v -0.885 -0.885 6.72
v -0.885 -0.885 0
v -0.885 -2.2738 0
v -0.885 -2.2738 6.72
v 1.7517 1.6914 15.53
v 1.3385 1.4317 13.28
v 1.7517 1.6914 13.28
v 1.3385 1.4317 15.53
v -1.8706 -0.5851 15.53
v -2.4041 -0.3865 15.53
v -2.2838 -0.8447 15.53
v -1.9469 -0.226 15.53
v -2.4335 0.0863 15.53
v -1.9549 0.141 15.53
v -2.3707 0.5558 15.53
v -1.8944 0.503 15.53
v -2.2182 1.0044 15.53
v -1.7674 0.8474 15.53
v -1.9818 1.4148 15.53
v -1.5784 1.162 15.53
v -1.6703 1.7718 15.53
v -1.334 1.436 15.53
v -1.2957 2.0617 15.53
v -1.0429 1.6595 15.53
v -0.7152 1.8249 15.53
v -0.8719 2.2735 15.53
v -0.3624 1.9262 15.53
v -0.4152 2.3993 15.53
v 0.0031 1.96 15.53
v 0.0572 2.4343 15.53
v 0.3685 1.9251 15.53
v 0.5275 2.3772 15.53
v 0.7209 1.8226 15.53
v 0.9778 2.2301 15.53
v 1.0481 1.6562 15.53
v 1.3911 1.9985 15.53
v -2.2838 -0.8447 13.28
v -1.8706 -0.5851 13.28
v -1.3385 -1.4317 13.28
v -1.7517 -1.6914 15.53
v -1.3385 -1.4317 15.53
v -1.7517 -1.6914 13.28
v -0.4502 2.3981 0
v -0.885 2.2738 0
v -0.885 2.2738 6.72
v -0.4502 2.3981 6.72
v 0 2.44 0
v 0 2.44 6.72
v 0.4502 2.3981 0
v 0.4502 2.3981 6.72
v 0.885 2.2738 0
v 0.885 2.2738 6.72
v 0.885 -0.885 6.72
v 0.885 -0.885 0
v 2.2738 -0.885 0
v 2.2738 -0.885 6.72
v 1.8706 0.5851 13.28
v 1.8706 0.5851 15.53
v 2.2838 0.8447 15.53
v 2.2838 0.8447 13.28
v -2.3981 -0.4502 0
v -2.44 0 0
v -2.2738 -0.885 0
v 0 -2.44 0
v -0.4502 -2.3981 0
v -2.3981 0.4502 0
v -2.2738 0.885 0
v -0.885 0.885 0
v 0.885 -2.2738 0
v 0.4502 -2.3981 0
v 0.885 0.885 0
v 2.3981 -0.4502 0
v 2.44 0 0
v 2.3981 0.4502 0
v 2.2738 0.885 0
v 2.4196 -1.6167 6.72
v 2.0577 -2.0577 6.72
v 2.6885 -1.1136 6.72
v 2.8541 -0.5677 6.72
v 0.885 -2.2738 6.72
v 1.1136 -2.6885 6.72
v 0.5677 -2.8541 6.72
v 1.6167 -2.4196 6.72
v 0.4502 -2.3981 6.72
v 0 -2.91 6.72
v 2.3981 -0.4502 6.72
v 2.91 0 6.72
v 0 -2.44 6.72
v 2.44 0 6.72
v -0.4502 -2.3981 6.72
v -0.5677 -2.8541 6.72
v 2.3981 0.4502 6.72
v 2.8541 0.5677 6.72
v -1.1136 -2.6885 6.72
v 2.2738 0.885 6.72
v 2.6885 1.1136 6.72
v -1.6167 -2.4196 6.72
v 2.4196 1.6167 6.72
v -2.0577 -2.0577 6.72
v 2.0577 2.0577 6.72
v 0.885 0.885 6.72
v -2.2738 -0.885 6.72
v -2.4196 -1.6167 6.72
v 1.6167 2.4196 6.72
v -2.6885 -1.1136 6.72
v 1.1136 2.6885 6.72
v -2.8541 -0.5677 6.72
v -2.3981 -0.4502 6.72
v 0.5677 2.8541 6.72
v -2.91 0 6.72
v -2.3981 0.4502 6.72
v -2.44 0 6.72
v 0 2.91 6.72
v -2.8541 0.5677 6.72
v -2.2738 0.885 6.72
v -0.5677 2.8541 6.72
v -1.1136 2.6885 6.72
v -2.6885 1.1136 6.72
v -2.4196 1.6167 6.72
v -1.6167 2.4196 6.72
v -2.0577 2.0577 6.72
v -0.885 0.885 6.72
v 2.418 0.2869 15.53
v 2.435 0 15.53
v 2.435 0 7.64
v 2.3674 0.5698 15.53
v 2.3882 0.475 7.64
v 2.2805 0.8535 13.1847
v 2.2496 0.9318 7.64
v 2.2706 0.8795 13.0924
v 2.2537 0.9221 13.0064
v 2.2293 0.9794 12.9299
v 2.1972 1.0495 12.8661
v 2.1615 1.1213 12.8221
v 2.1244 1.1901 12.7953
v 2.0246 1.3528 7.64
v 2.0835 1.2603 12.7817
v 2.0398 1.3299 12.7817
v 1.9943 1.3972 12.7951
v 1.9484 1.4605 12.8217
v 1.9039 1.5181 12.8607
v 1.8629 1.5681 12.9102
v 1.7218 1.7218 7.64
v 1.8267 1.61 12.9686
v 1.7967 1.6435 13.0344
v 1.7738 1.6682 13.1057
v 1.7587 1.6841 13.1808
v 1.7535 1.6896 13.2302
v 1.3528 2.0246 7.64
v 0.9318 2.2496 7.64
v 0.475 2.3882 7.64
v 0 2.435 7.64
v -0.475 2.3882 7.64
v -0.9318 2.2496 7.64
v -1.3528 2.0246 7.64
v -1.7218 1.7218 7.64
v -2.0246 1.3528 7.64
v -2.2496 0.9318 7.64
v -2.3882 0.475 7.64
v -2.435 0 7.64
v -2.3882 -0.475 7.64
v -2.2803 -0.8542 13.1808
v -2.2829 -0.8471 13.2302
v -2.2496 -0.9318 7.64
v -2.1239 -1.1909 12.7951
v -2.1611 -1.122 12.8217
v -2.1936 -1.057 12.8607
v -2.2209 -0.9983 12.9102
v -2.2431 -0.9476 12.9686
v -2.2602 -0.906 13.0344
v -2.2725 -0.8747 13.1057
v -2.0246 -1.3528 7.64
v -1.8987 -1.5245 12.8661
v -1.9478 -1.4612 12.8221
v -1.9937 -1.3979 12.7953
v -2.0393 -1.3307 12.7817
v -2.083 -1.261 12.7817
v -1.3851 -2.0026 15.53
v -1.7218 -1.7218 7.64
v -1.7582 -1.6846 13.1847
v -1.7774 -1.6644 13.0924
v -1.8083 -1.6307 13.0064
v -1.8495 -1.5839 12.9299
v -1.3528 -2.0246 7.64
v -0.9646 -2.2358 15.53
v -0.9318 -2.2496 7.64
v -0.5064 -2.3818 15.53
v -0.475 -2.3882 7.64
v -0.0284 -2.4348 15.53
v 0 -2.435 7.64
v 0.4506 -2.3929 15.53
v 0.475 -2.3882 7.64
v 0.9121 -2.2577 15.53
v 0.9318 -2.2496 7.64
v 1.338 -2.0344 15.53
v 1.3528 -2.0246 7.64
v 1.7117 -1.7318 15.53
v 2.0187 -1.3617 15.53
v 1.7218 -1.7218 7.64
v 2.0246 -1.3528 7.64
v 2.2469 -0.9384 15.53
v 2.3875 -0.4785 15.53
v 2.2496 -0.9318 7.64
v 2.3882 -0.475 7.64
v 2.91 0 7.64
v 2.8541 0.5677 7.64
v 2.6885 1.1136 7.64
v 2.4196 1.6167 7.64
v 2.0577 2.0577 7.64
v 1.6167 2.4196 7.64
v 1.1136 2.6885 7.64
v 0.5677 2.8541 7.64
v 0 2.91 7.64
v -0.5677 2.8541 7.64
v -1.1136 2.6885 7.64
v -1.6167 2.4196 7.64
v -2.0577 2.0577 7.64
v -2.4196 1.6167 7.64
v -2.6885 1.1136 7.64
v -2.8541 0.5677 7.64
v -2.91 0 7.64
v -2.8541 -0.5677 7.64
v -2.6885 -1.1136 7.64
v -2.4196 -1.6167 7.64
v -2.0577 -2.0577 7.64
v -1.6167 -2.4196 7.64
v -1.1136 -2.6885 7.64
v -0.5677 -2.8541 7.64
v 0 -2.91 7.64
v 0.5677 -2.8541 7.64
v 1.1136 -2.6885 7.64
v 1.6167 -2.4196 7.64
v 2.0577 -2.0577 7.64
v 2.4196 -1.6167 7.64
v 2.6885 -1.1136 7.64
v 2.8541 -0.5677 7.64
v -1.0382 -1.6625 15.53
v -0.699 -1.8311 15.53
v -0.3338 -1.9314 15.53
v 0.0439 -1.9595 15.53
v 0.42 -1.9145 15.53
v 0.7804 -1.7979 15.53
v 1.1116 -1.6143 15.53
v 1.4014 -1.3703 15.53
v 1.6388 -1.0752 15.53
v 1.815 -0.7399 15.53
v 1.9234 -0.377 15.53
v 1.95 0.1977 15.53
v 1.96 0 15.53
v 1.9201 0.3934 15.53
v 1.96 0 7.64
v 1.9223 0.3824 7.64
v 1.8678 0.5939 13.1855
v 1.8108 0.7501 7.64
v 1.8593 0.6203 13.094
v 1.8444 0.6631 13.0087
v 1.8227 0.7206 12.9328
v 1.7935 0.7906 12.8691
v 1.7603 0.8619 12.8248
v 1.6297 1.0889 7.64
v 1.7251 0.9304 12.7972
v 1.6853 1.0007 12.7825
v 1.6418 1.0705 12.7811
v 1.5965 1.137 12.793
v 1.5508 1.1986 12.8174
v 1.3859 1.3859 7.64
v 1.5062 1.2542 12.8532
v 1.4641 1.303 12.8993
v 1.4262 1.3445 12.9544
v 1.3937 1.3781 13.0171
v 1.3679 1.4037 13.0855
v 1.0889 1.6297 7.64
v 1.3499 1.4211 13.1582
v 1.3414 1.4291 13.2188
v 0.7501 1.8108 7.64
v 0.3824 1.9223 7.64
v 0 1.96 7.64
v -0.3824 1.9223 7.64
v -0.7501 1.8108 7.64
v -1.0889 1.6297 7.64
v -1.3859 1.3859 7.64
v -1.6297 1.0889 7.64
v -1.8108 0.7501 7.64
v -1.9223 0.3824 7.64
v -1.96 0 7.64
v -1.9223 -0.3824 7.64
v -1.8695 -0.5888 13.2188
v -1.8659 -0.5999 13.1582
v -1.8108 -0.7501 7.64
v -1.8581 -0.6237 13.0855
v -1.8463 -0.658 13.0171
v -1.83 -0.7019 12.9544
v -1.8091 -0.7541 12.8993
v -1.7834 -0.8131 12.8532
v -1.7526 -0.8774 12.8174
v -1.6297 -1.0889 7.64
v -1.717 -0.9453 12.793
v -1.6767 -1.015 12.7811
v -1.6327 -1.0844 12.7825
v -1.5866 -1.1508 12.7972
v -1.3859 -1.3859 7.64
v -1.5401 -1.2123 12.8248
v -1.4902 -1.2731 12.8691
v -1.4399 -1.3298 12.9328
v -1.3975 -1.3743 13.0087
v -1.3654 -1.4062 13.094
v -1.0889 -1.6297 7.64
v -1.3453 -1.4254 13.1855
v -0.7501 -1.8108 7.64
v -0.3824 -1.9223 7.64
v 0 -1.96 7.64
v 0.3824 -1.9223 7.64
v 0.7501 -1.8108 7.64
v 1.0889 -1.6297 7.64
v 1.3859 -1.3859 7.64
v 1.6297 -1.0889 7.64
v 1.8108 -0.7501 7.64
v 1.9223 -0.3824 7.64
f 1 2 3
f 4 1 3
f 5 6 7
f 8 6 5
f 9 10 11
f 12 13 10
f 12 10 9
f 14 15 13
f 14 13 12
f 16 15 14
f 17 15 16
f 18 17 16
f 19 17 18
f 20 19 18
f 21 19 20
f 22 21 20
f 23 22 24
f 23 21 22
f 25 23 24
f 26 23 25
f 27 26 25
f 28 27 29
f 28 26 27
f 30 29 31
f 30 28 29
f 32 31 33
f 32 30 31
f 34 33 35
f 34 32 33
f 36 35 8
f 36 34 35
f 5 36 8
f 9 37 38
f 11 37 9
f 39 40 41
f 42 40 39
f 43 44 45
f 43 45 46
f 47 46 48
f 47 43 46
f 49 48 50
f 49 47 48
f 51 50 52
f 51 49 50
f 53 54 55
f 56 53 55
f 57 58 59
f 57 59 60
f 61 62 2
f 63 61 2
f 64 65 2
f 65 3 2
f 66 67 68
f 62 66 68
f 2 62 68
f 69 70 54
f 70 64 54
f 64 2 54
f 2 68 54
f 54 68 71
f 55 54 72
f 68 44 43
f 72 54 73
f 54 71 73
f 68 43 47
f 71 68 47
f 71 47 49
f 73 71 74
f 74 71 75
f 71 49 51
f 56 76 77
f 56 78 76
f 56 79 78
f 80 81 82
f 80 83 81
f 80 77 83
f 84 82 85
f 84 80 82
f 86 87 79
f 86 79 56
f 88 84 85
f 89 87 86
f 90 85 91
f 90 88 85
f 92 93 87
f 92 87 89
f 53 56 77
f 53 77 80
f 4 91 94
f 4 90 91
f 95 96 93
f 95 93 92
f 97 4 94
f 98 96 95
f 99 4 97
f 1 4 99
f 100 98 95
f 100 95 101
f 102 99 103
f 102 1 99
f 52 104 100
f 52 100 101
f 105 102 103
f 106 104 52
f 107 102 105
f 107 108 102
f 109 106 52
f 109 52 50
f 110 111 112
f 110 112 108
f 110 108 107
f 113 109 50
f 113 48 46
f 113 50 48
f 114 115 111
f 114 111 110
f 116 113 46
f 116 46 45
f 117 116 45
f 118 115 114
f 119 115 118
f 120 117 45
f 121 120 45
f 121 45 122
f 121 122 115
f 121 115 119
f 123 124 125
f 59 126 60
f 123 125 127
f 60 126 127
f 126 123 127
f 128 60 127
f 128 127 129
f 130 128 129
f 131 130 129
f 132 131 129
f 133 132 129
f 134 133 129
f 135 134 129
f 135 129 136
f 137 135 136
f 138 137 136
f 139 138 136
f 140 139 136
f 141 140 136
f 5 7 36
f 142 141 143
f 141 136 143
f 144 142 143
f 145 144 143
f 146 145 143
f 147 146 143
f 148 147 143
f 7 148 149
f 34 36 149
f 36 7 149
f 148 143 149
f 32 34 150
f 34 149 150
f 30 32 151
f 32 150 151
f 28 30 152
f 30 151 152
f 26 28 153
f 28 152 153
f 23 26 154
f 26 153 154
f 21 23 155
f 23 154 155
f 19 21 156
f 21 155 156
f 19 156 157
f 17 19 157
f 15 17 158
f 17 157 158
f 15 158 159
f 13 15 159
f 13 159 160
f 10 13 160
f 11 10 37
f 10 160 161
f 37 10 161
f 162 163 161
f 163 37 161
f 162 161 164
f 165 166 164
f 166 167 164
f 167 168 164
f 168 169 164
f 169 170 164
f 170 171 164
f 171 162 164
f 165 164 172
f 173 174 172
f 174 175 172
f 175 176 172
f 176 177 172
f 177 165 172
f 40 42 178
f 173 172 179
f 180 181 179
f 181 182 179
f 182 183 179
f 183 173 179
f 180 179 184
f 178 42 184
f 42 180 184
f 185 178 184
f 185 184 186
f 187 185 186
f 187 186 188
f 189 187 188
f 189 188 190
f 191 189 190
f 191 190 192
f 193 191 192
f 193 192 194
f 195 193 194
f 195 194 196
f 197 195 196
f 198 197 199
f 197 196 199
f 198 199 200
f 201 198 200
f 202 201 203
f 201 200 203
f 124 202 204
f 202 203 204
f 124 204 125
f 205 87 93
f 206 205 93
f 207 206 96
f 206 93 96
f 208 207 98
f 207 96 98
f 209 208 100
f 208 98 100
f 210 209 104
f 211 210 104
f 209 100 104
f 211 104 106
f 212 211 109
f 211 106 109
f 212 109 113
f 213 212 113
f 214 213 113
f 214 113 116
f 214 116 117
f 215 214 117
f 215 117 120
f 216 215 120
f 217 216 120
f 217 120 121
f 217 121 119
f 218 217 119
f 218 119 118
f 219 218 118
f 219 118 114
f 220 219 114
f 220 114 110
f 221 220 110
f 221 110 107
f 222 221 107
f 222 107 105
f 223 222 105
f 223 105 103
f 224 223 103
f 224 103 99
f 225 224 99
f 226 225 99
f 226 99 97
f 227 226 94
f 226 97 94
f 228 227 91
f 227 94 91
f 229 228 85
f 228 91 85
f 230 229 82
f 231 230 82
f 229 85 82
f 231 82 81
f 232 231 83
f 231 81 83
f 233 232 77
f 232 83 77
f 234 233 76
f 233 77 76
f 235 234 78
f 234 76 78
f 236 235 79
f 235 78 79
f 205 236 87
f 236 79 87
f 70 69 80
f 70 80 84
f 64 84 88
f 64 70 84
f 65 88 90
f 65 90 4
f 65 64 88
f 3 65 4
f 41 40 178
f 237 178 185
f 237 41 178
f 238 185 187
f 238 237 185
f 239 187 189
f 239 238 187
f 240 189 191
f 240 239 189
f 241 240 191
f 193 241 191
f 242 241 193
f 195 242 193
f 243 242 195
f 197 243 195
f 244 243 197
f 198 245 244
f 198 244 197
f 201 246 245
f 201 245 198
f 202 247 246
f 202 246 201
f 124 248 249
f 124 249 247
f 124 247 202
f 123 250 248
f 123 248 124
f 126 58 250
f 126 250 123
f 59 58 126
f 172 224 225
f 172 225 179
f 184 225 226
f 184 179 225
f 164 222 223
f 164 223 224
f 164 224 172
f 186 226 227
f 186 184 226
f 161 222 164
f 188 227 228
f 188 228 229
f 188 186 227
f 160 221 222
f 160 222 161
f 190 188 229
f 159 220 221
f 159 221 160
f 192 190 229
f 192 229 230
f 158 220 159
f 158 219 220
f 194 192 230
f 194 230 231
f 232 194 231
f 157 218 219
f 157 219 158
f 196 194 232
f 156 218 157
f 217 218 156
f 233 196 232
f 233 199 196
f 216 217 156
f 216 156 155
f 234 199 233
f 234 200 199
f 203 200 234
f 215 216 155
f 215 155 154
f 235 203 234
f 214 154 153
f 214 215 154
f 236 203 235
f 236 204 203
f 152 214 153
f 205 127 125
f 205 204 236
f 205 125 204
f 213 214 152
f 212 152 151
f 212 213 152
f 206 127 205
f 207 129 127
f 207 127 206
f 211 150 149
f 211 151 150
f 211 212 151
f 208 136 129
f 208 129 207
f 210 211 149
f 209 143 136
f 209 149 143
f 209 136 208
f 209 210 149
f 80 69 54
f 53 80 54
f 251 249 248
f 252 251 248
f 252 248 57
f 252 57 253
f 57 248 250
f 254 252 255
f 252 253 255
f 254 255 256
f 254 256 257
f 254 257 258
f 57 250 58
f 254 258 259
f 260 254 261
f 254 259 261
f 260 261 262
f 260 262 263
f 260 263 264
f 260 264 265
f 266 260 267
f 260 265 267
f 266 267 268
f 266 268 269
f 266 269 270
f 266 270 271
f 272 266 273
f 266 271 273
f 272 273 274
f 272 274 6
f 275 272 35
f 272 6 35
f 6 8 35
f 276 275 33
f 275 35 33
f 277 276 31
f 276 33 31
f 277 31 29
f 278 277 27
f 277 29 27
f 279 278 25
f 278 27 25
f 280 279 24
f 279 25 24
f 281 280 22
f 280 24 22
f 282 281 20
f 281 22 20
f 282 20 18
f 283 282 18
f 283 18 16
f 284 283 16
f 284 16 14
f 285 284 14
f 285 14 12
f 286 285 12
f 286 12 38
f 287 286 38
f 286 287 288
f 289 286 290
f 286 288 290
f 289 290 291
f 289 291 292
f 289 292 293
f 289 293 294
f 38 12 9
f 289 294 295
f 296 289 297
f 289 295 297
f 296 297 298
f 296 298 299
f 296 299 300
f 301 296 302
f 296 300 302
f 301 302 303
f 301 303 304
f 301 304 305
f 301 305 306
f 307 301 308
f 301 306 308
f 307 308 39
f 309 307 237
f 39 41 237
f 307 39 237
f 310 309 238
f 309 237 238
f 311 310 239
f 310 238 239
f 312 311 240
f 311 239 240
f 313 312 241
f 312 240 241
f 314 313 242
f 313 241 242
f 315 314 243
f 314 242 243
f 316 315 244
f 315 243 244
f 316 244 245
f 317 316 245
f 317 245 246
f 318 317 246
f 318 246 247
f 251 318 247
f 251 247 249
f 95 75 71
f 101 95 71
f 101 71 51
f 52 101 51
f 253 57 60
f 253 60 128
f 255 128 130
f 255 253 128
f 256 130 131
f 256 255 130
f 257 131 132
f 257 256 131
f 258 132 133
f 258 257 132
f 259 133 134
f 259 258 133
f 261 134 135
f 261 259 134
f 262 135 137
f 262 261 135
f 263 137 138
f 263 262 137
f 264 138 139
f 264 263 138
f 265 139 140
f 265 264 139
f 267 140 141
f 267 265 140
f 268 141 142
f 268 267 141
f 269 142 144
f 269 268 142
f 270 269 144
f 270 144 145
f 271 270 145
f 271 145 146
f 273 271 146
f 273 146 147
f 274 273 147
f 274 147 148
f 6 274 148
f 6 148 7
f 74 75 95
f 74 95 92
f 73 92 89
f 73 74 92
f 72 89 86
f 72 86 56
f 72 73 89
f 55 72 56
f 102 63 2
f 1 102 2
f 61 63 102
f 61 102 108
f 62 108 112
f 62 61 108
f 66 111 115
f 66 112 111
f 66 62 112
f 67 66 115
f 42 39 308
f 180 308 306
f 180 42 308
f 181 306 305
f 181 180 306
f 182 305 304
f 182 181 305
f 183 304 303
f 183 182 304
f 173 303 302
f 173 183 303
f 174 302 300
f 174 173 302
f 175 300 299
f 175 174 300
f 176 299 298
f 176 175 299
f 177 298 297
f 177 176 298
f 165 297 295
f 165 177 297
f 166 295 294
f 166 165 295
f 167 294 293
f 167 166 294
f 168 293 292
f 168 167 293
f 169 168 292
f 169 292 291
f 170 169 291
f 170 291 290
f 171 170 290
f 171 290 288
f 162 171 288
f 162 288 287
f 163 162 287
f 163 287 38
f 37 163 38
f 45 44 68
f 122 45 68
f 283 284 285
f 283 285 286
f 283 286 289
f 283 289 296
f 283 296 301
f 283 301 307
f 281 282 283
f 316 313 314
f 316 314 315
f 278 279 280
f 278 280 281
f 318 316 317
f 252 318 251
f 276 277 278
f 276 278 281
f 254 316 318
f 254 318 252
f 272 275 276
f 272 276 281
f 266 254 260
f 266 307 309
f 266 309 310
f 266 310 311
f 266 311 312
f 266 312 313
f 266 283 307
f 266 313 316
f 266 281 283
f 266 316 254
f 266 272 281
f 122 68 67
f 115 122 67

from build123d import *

# Parameters (mm, degrees)
SKETCH1_R           = 2.91
BOSS_EXTRUDE1_DEPTH = 15.53
CUT_EXTRUDE2_START  = -7.89
SKETCH2_R           = 2.91
SKETCH2_R_2         = 2.435
CUT_EXTRUDE2_DEPTH  = 7.89
SKETCH4_R           = 1.96
CUT_EXTRUDE3_DEPTH  = 7.89
CUT_EXTRUDE6_DEPTH  = 7.89
SKETCH10_R          = 2.91
SKETCH10_R_2        = 2.44
CUT_EXTRUDE10_DEPTH = 6.72


with BuildPart() as part:
    # Sketch1 → Boss-Extrude1 (new body)
    with BuildSketch(Plane.XY):
        Circle(SKETCH1_R)
    extrude(amount=BOSS_EXTRUDE1_DEPTH)

    # Sketch2 → Cut-Extrude2 (cut)
    with BuildSketch(Plane.XY.offset(15.53).offset(CUT_EXTRUDE2_START)):
        Circle(SKETCH2_R)
        Circle(SKETCH2_R_2, mode=Mode.SUBTRACT)
    extrude(amount=CUT_EXTRUDE2_DEPTH, mode=Mode.SUBTRACT)

    # Sketch4 → Cut-Extrude3 (cut)
    with BuildSketch(Plane.XY.offset(15.53)):
        Circle(SKETCH4_R)
    extrude(amount=-CUT_EXTRUDE3_DEPTH, mode=Mode.SUBTRACT)

    # Sketch6 → Cut-Extrude6 (cut)
    with BuildSketch(Plane(origin=(-2.06167752, -1.295650727, 0), x_dir=(0, 0, 1), z_dir=(-0.8466848129866222, -0.5320947542100077, 0))):
        with BuildLine():
            Line((15.53, -0.5), (13.28, -0.5))
            ThreePointArc((13.28, -0.5), (12.78, 0), (13.28, 0.5))
            Line((13.28, 0.5), (15.53, 0.5))
            ThreePointArc((15.53, 0.5), (16.03, 0), (15.53, -0.5))
        make_face()
    extrude(amount=-CUT_EXTRUDE6_DEPTH, mode=Mode.SUBTRACT)

    # Sketch10 → Cut-Extrude10 (cut)
    # profile 1 of 5: a face of its own
    with BuildSketch(Plane(origin=(0, 0, 0), x_dir=(-1, 0, 0), z_dir=(0, 0, -1))):
        Circle(SKETCH10_R)
        Circle(SKETCH10_R_2, mode=Mode.SUBTRACT)
    # profile 2 of 5: a face of its own
    with BuildSketch(Plane(origin=(0, 0, 0), x_dir=(-1, 0, 0), z_dir=(0, 0, -1))):
        with BuildLine():
            Line((-2.273845861, 0.885), (-0.885, 0.885))
            Line((-0.885, 0.885), (-0.885, 2.273845861))
            ThreePointArc((-0.885, 2.273845861), (-1.725340546, 1.725340546), (-2.273845861, 0.885))
        make_face()
    # profile 3 of 5: a face of its own
    with BuildSketch(Plane(origin=(0, 0, 0), x_dir=(-1, 0, 0), z_dir=(0, 0, -1))):
        with BuildLine():
            Line((0.885, 2.273845861), (0.885, 0.885))
            Line((0.885, 0.885), (2.273845861, 0.885))
            ThreePointArc((2.273845861, 0.885), (1.725340546, 1.725340546), (0.885, 2.273845861))
        make_face()
    # profile 4 of 5: a face of its own
    with BuildSketch(Plane(origin=(0, 0, 0), x_dir=(-1, 0, 0), z_dir=(0, 0, -1))):
        with BuildLine():
            Line((0.885, -0.885), (0.885, -2.273845861))
            ThreePointArc((0.885, -2.273845861), (1.725340546, -1.725340546), (2.273845861, -0.885))
            Line((2.273845861, -0.885), (0.885, -0.885))
        make_face()
    # profile 5 of 5: a face of its own
    with BuildSketch(Plane(origin=(0, 0, 0), x_dir=(-1, 0, 0), z_dir=(0, 0, -1))):
        with BuildLine():
            ThreePointArc((-2.273845861, -0.885), (-1.725340546, -1.725340546), (-0.885, -2.273845861))
            Line((-0.885, -2.273845861), (-0.885, -0.885))
            Line((-0.885, -0.885), (-2.273845861, -0.885))
        make_face()
    extrude(amount=-CUT_EXTRUDE10_DEPTH, mode=Mode.SUBTRACT)


solid = part.part
